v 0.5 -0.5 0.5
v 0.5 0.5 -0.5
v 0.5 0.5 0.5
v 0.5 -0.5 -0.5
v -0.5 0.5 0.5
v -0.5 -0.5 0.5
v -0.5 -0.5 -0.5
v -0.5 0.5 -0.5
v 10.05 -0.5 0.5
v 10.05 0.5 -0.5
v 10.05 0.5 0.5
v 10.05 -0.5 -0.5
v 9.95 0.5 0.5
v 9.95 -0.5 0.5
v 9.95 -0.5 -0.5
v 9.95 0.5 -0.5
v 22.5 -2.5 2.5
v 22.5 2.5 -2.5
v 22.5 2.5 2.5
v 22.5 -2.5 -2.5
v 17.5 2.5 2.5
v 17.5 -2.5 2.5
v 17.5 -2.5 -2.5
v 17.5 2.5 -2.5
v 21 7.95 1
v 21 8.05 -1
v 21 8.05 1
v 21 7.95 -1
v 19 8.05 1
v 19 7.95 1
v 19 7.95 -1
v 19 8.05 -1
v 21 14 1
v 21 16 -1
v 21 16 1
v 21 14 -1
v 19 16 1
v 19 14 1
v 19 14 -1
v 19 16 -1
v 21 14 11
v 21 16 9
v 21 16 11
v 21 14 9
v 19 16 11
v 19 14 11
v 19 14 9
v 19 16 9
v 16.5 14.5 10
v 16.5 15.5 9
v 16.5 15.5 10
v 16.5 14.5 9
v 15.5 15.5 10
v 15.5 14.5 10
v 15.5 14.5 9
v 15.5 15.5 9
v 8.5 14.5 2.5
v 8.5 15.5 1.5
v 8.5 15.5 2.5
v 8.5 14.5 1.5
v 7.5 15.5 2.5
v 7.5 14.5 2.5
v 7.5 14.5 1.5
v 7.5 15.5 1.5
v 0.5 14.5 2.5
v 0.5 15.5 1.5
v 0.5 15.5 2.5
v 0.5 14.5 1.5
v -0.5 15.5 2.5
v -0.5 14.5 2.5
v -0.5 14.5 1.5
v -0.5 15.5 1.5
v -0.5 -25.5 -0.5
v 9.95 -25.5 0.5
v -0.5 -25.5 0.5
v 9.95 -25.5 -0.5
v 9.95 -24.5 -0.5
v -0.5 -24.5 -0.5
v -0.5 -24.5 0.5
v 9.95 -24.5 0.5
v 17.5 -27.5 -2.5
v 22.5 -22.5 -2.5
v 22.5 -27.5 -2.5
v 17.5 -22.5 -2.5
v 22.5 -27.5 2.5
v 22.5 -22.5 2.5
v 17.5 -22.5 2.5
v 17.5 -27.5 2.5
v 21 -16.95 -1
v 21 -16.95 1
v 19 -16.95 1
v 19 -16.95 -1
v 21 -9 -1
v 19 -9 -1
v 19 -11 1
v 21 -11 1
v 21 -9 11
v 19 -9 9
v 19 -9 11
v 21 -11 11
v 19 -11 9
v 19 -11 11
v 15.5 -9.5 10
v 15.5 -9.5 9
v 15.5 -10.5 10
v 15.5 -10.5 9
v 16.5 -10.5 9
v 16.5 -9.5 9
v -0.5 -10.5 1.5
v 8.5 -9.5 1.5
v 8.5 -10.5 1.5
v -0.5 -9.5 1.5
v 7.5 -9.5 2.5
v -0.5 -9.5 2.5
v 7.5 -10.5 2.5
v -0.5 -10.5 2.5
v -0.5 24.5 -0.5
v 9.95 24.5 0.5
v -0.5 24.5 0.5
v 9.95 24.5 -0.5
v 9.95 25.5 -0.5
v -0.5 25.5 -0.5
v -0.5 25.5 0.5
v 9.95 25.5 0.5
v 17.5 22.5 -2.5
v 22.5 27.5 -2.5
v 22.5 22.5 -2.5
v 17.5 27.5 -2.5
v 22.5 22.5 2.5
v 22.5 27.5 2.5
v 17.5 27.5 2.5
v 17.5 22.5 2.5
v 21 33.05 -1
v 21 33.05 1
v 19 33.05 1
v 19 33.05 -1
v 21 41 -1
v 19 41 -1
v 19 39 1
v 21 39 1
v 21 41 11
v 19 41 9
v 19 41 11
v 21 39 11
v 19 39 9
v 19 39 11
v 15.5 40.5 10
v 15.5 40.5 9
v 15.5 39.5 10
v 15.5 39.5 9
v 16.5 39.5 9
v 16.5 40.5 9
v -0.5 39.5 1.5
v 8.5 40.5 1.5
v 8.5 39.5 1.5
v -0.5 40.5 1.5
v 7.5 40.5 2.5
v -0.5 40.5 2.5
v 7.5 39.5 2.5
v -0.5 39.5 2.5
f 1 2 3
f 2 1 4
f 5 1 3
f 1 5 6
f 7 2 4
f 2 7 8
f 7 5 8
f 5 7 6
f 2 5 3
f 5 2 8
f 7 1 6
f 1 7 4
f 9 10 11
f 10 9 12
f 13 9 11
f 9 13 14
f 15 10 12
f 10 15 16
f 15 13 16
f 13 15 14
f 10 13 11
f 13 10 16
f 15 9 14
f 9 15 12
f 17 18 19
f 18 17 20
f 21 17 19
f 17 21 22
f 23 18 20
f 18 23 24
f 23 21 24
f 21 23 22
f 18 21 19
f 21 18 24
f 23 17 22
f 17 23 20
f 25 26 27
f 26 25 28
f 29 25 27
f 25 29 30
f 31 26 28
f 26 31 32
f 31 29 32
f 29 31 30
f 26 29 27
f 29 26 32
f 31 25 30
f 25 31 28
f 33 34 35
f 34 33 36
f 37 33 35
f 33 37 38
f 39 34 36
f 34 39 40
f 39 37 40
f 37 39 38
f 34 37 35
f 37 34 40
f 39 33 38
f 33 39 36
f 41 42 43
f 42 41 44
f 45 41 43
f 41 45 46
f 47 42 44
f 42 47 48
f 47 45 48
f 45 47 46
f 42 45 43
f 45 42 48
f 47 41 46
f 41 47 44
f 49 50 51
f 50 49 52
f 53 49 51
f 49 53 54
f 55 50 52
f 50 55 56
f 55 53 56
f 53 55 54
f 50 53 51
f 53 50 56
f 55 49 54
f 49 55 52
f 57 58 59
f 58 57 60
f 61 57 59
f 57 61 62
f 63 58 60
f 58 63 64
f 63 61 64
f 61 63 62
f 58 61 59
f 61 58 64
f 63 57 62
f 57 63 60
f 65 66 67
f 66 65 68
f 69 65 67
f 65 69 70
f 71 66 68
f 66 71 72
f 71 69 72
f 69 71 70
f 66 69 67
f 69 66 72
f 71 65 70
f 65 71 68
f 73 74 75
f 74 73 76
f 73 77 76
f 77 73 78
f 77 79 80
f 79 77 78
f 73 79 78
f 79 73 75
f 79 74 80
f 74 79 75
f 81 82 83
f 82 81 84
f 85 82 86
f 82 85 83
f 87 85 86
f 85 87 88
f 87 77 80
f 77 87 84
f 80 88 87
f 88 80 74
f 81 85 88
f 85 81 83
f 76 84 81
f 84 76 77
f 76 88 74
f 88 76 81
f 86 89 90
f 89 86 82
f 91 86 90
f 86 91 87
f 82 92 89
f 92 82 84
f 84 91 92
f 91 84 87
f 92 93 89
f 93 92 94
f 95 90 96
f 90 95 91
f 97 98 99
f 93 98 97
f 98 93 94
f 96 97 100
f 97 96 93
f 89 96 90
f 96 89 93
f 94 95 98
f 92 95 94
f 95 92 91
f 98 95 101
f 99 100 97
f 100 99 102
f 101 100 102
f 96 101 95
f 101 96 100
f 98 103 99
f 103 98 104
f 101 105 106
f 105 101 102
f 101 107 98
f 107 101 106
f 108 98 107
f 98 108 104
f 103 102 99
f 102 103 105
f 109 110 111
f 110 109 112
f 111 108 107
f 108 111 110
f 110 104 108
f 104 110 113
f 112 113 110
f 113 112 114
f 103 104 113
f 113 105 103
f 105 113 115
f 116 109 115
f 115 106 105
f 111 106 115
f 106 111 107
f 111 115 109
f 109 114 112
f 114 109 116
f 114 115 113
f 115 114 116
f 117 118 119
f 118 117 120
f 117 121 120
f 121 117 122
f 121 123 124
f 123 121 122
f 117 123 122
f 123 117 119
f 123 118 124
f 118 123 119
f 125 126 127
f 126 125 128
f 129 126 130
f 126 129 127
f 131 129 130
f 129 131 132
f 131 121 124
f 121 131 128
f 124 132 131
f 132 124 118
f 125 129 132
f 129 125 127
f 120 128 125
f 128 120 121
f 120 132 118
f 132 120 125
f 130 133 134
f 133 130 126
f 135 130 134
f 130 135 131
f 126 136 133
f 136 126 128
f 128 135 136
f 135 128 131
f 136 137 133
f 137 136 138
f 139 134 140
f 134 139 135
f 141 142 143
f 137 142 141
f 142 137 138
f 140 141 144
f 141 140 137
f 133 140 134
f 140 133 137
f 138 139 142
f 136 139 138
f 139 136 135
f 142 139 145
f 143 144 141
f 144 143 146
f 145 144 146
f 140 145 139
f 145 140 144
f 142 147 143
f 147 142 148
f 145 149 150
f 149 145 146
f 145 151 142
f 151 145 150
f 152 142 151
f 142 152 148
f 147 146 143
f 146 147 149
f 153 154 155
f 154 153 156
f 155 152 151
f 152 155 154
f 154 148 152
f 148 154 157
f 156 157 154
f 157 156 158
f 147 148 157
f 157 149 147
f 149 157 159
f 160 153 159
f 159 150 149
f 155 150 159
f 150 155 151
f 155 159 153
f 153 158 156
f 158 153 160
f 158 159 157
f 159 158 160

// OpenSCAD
module shape3D(size, position, center=true) {
    translate(position) cube(size, center=center);
}

// See https://forum.openscad.org/Calculating-Summarize-Arrays-generate-Array-td29132.html
function partial_sum(v, n, r = 0) = n <= 0 
        ? r + v[0] 
        : partial_sum(v, n - 1, r + v[n]); 

function partial_sum_vectors(v, n, r = [0,0,0]) = partial_sum(v, n, r); 

// // Tests for partial_sum and partial_sum_vectors
// dim = [10, 8, 2, 25, 5]; 
// n = len(dim); 
// x_pos = [for(i = [0:n-1]) partial_sum(dim, i)]; 
// echo(x_pos); // ECHO: [10, 18, 20, 45, 50] 
// echo("");
// dim2 = [[10, 1], [8, 1], [2, 1], [25, 1], [5, 2]]; 
// n2 = len(dim2); 
// x_pos2 = [for(i = [0:n2-1]) partial_sum_vectors(dim2, i)]; 
// echo(x_pos2); // ECHO: [[10, 1], [18, 2], [20, 3], [45, 4], [50, 6]]
// echo("");
// x_pos3 = [for(i = [0:n2-1]) partial_sum(dim2, i, [0,0,0])]; 
// echo(x_pos3); // ECHO: [[10, 1], [18, 2], [20, 3], [45, 4], [50, 6]]
// echo("");


module polychannel_absolute_positions(sizes, positions, clr="lightblue", center=true) {
    for (i = [1:len(sizes)-1]) {
        color(clr) hull() {
            shape3D(sizes[i-1], positions[i-1]);
            shape3D(sizes[i], positions[i]);
        };
    };
}
module polychannel_absolute_positions_shapes_only(sizes, positions, clr="lightblue", center=true) {
    for (i = [0:len(sizes)-1]) {
        color(clr) shape3D(sizes[i], positions[i]);
    }
}

module polychannel(sizes, positions=[], relative_positions=false, clr="lightblue", center=true, show_only_shapes=false) {
    if (relative_positions) {
        absolute_positions = [for(i = [0:len(sizes)-1]) partial_sum_vectors(positions, i)];
        if (show_only_shapes)
            polychannel_absolute_positions_shapes_only(sizes, absolute_positions, clr=clr, center=center);
        else
            polychannel_absolute_positions(sizes, absolute_positions, clr=clr, center=center);
    } else {
        if (show_only_shapes)
            polychannel_absolute_positions_shapes_only(sizes, positions, clr=clr, center=center);
        else
            polychannel_absolute_positions(sizes, positions, clr=clr, center=center);
    }
}

size1 = [1, 1, 1];

sizes = [
    size1,
    [0.1, 1, 1],
    5*size1,
    [2, 0.1, 2],
    2*size1,
    2*size1,
    size1,
    size1,
    size1
];
positions = [
    [0, 0, 0],
    [10, 0, 0],
    [20, 0, 0],
    [20, 8, 0],
    [20, 15, 0],
    [20, 15, 10],
    [16, 15, 9.5],
    [8, 15, 2],
    [0, 15, 2]
];
relative_positions = [
    [0, 0, 0],
    [10, 0, 0],
    [10, 0, 0],
    [0, 8, 0],
    [0, 7, 0],
    [0, 0, 10],
    [-4, 0, -0.5],
    [-8, 0, -7.5],
    [-8, 0, 0]
];

polychannel_absolute_positions_shapes_only(sizes, positions, clr="red");

translate([0, -25, 0]) polychannel(sizes, positions, clr="Salmon");

translate([0, 25, 0]) polychannel(sizes, relative_positions, relative_positions=true, clr="lightblue");
